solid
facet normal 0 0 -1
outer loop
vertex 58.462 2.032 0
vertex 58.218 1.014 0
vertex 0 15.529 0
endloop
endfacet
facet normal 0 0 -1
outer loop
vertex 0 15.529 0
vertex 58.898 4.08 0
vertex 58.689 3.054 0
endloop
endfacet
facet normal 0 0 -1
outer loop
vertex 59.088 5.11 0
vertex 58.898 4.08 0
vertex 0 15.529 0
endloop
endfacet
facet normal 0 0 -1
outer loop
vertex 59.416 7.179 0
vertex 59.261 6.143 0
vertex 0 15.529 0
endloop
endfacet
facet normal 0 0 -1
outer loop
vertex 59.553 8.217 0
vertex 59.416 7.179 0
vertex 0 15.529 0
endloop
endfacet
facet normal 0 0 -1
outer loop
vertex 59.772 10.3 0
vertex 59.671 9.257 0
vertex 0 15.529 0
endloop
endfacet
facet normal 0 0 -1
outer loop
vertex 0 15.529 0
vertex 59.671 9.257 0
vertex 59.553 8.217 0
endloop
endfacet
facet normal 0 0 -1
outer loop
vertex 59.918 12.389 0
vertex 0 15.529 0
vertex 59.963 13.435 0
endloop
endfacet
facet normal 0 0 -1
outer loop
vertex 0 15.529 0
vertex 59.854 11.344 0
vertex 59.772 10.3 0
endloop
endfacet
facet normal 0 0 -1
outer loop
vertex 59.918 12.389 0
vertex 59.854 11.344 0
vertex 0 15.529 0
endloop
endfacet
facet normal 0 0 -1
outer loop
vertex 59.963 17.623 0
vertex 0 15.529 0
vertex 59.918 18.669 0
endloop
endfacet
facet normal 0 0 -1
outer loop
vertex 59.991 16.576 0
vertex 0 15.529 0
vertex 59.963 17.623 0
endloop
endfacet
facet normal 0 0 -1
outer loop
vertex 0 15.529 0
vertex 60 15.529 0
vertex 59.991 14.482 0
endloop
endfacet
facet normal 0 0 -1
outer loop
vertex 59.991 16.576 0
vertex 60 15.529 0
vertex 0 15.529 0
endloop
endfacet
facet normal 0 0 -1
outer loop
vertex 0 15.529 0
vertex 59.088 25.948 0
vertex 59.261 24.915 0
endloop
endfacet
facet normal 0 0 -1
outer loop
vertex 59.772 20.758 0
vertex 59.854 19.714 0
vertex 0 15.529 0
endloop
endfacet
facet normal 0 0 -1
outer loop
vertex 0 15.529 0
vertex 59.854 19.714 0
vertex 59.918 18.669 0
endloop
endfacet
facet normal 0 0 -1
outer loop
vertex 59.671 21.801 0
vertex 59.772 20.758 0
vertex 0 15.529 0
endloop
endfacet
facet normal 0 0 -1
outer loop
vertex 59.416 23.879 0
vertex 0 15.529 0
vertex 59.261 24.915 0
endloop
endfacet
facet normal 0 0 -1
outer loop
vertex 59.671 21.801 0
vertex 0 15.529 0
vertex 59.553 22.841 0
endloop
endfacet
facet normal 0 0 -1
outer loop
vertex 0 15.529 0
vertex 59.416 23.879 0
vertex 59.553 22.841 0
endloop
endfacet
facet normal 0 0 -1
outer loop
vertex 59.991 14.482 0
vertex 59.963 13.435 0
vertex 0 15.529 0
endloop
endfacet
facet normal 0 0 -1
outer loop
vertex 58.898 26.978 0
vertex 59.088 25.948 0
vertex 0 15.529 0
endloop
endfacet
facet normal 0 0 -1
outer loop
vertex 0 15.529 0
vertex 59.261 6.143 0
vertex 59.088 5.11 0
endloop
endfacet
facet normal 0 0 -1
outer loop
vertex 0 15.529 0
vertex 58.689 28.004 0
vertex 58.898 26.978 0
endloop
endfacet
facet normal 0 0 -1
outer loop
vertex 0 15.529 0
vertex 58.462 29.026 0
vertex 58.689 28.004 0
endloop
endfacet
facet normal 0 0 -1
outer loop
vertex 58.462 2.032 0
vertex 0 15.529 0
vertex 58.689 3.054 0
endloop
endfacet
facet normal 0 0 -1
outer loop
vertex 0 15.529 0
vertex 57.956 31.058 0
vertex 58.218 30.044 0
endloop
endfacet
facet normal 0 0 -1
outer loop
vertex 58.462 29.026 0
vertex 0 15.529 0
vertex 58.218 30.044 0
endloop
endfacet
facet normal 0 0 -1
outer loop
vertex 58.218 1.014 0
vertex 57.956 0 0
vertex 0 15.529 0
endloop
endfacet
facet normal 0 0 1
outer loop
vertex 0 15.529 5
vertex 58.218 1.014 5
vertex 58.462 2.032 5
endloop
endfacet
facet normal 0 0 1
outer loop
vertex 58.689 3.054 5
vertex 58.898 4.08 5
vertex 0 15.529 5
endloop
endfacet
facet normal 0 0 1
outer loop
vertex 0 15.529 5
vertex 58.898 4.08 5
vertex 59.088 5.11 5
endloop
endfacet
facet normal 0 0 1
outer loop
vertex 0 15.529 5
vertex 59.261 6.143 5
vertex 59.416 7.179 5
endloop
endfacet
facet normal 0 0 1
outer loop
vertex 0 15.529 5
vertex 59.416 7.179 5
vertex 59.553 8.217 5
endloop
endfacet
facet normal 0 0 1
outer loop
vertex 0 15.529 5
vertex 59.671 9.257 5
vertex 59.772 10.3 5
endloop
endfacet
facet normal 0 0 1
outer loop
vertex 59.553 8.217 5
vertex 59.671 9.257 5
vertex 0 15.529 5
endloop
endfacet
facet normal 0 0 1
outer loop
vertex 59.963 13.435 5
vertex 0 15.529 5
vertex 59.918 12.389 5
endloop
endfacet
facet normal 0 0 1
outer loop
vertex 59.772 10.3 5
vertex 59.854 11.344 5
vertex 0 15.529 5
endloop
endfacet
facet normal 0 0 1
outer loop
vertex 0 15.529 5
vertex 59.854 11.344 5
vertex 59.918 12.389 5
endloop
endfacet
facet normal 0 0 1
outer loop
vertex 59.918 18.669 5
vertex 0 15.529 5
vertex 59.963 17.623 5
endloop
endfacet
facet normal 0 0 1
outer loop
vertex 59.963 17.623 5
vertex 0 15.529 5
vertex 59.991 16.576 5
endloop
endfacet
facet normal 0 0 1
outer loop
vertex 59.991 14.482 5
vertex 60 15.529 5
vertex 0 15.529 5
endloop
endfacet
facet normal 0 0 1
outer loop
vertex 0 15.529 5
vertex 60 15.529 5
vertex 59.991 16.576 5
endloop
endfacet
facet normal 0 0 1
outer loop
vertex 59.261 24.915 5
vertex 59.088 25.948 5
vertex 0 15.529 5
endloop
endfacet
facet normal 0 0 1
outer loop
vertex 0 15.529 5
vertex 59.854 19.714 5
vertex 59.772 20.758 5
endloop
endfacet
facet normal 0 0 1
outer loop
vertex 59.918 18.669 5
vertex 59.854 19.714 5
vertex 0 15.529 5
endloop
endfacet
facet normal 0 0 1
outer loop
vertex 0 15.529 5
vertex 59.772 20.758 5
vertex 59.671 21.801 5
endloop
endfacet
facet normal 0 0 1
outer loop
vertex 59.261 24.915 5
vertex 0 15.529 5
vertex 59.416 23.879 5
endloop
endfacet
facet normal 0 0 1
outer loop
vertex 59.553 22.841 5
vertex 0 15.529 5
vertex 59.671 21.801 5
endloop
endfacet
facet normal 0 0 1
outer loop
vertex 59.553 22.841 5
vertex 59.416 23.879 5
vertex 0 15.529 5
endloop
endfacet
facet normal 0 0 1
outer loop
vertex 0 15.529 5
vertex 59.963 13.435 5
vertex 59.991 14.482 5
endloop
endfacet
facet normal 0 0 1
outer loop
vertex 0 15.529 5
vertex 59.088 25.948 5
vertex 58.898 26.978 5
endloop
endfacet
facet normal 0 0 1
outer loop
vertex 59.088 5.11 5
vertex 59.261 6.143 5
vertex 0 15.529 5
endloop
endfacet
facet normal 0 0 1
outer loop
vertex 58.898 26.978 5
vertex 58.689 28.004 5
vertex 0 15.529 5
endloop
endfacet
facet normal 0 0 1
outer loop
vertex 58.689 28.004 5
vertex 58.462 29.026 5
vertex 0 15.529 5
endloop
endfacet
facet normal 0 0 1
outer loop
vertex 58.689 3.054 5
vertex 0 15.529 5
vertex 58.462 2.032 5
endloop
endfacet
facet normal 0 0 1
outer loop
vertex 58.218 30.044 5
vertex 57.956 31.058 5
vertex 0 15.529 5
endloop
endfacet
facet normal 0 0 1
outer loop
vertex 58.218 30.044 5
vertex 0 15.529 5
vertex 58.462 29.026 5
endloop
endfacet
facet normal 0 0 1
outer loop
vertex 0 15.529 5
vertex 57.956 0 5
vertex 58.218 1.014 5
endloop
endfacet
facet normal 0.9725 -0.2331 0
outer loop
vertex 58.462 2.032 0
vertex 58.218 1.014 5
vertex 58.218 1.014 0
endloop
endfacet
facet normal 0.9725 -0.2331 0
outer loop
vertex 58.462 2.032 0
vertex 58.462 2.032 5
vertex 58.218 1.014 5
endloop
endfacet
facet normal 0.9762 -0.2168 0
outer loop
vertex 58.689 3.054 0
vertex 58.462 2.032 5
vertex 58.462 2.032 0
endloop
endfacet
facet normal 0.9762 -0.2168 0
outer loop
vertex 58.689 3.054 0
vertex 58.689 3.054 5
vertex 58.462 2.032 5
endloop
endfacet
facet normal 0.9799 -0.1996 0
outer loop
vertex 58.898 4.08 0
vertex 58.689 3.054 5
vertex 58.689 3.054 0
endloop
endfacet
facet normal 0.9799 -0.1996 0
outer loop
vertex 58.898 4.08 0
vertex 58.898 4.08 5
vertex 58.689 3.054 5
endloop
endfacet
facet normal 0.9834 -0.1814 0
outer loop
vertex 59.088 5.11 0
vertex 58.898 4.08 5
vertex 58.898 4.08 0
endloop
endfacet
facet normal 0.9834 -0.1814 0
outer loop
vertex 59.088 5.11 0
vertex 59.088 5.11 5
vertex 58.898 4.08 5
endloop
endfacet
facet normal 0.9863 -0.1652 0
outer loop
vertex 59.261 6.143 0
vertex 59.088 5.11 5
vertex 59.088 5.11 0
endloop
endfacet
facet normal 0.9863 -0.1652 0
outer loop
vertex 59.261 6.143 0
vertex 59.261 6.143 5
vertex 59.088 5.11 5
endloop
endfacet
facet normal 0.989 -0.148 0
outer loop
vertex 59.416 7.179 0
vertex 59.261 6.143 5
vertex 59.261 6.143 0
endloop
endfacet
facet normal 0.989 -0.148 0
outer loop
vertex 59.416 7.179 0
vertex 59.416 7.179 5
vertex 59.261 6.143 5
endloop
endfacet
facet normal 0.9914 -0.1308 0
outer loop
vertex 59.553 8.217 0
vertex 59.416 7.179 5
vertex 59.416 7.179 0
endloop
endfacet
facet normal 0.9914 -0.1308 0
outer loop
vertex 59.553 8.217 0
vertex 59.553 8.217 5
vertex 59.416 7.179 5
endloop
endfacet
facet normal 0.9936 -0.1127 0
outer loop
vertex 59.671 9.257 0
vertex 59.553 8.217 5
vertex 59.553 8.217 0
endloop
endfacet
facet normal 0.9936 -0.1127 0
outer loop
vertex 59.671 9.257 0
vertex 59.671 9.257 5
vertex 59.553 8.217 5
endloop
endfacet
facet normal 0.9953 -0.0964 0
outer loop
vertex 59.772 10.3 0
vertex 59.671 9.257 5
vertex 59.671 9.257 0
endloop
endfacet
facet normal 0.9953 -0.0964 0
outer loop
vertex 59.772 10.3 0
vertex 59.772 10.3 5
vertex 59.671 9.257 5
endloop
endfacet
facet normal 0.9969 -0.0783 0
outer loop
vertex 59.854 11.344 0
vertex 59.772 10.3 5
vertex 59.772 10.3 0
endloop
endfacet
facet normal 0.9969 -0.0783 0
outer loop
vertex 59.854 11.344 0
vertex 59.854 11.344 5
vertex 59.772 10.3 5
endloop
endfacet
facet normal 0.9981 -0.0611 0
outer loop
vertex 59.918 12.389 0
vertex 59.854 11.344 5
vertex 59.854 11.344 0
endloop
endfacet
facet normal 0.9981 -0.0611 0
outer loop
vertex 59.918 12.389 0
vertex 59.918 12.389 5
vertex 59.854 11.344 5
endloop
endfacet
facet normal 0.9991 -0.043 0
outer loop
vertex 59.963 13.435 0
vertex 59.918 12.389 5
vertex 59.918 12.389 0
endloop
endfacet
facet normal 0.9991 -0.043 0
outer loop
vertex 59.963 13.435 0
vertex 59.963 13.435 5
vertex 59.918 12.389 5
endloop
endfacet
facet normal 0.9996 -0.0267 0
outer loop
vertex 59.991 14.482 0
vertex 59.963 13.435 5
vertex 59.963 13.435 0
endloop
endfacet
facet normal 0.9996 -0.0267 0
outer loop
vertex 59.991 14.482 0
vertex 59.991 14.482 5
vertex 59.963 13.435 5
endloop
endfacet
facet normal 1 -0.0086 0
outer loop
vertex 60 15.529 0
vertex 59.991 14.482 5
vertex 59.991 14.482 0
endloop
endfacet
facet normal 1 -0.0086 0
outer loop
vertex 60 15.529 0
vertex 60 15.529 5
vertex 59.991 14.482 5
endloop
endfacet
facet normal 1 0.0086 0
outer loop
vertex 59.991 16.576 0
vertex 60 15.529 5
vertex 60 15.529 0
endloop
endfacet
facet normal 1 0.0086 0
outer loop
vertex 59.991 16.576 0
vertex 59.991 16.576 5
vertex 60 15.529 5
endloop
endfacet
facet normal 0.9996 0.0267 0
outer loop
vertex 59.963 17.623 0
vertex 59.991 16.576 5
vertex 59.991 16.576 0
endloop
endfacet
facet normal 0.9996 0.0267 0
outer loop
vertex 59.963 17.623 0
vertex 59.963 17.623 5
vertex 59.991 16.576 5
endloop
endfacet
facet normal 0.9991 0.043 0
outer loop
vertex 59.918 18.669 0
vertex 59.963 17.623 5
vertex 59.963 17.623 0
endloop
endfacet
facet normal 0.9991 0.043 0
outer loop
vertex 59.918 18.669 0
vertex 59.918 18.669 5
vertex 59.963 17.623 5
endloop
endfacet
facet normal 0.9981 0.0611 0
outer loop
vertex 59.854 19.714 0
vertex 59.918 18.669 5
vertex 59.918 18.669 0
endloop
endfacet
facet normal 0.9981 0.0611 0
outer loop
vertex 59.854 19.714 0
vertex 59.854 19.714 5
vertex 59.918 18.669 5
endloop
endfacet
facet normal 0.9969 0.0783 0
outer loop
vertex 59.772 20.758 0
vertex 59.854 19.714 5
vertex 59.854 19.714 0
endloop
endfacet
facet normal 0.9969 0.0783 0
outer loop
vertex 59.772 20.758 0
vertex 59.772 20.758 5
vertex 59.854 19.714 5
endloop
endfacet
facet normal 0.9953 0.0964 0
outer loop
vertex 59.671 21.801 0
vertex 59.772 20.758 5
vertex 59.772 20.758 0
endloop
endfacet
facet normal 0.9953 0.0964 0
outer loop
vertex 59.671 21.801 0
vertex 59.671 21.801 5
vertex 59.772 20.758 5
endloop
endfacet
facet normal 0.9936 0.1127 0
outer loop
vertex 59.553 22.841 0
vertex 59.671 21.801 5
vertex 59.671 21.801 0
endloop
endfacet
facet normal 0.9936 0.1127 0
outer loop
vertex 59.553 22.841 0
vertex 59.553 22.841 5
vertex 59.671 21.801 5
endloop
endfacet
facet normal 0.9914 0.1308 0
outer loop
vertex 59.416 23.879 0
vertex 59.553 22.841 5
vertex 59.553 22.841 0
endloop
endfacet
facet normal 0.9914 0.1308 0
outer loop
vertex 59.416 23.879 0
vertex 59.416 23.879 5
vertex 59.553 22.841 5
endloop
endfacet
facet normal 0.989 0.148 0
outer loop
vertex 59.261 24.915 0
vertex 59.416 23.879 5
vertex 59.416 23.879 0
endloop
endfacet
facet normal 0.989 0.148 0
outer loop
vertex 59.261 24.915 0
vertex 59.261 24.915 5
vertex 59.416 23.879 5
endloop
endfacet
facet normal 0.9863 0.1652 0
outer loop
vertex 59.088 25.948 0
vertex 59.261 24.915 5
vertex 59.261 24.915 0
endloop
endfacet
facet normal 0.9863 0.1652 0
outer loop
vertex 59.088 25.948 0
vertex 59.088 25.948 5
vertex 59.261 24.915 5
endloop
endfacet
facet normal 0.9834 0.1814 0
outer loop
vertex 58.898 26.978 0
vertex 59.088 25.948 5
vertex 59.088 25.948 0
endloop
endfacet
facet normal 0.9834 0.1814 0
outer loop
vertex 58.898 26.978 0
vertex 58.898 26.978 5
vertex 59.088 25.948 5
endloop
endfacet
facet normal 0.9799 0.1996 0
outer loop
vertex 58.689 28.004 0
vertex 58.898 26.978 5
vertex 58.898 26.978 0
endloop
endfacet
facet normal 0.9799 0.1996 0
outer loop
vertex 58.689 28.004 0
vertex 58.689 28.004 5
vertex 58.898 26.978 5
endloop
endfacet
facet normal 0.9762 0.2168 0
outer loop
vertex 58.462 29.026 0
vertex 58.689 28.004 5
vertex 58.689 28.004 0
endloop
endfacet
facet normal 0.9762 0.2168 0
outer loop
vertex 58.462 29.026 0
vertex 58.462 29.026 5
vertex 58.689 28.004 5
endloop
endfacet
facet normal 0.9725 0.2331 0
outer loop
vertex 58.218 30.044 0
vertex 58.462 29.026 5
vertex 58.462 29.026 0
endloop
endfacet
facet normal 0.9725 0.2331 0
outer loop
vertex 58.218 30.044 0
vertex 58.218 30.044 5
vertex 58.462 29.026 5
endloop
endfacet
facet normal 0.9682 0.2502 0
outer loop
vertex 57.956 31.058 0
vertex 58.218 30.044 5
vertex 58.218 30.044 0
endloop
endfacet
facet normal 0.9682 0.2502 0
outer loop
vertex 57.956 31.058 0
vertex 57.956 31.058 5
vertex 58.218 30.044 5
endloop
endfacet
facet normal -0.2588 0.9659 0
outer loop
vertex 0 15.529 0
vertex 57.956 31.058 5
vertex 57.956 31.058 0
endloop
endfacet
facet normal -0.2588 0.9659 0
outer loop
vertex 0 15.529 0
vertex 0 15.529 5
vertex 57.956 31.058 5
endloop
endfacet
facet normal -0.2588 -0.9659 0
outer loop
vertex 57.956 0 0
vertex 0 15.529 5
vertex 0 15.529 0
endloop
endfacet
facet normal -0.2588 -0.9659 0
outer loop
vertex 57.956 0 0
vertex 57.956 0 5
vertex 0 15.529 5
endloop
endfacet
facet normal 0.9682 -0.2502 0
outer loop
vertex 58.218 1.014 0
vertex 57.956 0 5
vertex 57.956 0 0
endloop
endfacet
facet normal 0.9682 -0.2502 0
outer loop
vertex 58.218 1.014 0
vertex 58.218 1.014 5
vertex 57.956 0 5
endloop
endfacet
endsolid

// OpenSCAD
$fn = 32;

// ----------------------------------------------------------------------
// Arc profile plate: sector, 32 points
// ----------------------------------------------------------------------

// --- parameters (mm) ---
sector_angle = 30;        // sector angle, degrees
sector_r = 60;            // outer radius
arc_step = 1;             // sampling step of the arc, degrees
plate_t = 5;              // plate thickness, Z

bbox_x = 2 * sector_r * sin(sector_angle / 2);  // chord of the sector
bbox_y = sector_r;  // depth of the sector (apex to arc)

profile = [[57.956, 0], [58.218, 1.014], [58.462, 2.032], [58.689, 3.054], [58.898, 4.08], [59.088, 5.11], [59.261, 6.143], [59.416, 7.179], [59.553, 8.217], [59.671, 9.257], [59.772, 10.3], [59.854, 11.344], [59.918, 12.389], [59.963, 13.435], [59.991, 14.482], [60, 15.529], [59.991, 16.576], [59.963, 17.623], [59.918, 18.669], [59.854, 19.714], [59.772, 20.758], [59.671, 21.801], [59.553, 22.841], [59.416, 23.879], [59.261, 24.915], [59.088, 25.948], [58.898, 26.978], [58.689, 28.004], [58.462, 29.026], [58.218, 30.044], [57.956, 31.058], [0, 15.529]];  // primary outline, 32 points, counter clockwise

// --- the one profile operation ---
linear_extrude(height = plate_t) polygon(points = profile);
